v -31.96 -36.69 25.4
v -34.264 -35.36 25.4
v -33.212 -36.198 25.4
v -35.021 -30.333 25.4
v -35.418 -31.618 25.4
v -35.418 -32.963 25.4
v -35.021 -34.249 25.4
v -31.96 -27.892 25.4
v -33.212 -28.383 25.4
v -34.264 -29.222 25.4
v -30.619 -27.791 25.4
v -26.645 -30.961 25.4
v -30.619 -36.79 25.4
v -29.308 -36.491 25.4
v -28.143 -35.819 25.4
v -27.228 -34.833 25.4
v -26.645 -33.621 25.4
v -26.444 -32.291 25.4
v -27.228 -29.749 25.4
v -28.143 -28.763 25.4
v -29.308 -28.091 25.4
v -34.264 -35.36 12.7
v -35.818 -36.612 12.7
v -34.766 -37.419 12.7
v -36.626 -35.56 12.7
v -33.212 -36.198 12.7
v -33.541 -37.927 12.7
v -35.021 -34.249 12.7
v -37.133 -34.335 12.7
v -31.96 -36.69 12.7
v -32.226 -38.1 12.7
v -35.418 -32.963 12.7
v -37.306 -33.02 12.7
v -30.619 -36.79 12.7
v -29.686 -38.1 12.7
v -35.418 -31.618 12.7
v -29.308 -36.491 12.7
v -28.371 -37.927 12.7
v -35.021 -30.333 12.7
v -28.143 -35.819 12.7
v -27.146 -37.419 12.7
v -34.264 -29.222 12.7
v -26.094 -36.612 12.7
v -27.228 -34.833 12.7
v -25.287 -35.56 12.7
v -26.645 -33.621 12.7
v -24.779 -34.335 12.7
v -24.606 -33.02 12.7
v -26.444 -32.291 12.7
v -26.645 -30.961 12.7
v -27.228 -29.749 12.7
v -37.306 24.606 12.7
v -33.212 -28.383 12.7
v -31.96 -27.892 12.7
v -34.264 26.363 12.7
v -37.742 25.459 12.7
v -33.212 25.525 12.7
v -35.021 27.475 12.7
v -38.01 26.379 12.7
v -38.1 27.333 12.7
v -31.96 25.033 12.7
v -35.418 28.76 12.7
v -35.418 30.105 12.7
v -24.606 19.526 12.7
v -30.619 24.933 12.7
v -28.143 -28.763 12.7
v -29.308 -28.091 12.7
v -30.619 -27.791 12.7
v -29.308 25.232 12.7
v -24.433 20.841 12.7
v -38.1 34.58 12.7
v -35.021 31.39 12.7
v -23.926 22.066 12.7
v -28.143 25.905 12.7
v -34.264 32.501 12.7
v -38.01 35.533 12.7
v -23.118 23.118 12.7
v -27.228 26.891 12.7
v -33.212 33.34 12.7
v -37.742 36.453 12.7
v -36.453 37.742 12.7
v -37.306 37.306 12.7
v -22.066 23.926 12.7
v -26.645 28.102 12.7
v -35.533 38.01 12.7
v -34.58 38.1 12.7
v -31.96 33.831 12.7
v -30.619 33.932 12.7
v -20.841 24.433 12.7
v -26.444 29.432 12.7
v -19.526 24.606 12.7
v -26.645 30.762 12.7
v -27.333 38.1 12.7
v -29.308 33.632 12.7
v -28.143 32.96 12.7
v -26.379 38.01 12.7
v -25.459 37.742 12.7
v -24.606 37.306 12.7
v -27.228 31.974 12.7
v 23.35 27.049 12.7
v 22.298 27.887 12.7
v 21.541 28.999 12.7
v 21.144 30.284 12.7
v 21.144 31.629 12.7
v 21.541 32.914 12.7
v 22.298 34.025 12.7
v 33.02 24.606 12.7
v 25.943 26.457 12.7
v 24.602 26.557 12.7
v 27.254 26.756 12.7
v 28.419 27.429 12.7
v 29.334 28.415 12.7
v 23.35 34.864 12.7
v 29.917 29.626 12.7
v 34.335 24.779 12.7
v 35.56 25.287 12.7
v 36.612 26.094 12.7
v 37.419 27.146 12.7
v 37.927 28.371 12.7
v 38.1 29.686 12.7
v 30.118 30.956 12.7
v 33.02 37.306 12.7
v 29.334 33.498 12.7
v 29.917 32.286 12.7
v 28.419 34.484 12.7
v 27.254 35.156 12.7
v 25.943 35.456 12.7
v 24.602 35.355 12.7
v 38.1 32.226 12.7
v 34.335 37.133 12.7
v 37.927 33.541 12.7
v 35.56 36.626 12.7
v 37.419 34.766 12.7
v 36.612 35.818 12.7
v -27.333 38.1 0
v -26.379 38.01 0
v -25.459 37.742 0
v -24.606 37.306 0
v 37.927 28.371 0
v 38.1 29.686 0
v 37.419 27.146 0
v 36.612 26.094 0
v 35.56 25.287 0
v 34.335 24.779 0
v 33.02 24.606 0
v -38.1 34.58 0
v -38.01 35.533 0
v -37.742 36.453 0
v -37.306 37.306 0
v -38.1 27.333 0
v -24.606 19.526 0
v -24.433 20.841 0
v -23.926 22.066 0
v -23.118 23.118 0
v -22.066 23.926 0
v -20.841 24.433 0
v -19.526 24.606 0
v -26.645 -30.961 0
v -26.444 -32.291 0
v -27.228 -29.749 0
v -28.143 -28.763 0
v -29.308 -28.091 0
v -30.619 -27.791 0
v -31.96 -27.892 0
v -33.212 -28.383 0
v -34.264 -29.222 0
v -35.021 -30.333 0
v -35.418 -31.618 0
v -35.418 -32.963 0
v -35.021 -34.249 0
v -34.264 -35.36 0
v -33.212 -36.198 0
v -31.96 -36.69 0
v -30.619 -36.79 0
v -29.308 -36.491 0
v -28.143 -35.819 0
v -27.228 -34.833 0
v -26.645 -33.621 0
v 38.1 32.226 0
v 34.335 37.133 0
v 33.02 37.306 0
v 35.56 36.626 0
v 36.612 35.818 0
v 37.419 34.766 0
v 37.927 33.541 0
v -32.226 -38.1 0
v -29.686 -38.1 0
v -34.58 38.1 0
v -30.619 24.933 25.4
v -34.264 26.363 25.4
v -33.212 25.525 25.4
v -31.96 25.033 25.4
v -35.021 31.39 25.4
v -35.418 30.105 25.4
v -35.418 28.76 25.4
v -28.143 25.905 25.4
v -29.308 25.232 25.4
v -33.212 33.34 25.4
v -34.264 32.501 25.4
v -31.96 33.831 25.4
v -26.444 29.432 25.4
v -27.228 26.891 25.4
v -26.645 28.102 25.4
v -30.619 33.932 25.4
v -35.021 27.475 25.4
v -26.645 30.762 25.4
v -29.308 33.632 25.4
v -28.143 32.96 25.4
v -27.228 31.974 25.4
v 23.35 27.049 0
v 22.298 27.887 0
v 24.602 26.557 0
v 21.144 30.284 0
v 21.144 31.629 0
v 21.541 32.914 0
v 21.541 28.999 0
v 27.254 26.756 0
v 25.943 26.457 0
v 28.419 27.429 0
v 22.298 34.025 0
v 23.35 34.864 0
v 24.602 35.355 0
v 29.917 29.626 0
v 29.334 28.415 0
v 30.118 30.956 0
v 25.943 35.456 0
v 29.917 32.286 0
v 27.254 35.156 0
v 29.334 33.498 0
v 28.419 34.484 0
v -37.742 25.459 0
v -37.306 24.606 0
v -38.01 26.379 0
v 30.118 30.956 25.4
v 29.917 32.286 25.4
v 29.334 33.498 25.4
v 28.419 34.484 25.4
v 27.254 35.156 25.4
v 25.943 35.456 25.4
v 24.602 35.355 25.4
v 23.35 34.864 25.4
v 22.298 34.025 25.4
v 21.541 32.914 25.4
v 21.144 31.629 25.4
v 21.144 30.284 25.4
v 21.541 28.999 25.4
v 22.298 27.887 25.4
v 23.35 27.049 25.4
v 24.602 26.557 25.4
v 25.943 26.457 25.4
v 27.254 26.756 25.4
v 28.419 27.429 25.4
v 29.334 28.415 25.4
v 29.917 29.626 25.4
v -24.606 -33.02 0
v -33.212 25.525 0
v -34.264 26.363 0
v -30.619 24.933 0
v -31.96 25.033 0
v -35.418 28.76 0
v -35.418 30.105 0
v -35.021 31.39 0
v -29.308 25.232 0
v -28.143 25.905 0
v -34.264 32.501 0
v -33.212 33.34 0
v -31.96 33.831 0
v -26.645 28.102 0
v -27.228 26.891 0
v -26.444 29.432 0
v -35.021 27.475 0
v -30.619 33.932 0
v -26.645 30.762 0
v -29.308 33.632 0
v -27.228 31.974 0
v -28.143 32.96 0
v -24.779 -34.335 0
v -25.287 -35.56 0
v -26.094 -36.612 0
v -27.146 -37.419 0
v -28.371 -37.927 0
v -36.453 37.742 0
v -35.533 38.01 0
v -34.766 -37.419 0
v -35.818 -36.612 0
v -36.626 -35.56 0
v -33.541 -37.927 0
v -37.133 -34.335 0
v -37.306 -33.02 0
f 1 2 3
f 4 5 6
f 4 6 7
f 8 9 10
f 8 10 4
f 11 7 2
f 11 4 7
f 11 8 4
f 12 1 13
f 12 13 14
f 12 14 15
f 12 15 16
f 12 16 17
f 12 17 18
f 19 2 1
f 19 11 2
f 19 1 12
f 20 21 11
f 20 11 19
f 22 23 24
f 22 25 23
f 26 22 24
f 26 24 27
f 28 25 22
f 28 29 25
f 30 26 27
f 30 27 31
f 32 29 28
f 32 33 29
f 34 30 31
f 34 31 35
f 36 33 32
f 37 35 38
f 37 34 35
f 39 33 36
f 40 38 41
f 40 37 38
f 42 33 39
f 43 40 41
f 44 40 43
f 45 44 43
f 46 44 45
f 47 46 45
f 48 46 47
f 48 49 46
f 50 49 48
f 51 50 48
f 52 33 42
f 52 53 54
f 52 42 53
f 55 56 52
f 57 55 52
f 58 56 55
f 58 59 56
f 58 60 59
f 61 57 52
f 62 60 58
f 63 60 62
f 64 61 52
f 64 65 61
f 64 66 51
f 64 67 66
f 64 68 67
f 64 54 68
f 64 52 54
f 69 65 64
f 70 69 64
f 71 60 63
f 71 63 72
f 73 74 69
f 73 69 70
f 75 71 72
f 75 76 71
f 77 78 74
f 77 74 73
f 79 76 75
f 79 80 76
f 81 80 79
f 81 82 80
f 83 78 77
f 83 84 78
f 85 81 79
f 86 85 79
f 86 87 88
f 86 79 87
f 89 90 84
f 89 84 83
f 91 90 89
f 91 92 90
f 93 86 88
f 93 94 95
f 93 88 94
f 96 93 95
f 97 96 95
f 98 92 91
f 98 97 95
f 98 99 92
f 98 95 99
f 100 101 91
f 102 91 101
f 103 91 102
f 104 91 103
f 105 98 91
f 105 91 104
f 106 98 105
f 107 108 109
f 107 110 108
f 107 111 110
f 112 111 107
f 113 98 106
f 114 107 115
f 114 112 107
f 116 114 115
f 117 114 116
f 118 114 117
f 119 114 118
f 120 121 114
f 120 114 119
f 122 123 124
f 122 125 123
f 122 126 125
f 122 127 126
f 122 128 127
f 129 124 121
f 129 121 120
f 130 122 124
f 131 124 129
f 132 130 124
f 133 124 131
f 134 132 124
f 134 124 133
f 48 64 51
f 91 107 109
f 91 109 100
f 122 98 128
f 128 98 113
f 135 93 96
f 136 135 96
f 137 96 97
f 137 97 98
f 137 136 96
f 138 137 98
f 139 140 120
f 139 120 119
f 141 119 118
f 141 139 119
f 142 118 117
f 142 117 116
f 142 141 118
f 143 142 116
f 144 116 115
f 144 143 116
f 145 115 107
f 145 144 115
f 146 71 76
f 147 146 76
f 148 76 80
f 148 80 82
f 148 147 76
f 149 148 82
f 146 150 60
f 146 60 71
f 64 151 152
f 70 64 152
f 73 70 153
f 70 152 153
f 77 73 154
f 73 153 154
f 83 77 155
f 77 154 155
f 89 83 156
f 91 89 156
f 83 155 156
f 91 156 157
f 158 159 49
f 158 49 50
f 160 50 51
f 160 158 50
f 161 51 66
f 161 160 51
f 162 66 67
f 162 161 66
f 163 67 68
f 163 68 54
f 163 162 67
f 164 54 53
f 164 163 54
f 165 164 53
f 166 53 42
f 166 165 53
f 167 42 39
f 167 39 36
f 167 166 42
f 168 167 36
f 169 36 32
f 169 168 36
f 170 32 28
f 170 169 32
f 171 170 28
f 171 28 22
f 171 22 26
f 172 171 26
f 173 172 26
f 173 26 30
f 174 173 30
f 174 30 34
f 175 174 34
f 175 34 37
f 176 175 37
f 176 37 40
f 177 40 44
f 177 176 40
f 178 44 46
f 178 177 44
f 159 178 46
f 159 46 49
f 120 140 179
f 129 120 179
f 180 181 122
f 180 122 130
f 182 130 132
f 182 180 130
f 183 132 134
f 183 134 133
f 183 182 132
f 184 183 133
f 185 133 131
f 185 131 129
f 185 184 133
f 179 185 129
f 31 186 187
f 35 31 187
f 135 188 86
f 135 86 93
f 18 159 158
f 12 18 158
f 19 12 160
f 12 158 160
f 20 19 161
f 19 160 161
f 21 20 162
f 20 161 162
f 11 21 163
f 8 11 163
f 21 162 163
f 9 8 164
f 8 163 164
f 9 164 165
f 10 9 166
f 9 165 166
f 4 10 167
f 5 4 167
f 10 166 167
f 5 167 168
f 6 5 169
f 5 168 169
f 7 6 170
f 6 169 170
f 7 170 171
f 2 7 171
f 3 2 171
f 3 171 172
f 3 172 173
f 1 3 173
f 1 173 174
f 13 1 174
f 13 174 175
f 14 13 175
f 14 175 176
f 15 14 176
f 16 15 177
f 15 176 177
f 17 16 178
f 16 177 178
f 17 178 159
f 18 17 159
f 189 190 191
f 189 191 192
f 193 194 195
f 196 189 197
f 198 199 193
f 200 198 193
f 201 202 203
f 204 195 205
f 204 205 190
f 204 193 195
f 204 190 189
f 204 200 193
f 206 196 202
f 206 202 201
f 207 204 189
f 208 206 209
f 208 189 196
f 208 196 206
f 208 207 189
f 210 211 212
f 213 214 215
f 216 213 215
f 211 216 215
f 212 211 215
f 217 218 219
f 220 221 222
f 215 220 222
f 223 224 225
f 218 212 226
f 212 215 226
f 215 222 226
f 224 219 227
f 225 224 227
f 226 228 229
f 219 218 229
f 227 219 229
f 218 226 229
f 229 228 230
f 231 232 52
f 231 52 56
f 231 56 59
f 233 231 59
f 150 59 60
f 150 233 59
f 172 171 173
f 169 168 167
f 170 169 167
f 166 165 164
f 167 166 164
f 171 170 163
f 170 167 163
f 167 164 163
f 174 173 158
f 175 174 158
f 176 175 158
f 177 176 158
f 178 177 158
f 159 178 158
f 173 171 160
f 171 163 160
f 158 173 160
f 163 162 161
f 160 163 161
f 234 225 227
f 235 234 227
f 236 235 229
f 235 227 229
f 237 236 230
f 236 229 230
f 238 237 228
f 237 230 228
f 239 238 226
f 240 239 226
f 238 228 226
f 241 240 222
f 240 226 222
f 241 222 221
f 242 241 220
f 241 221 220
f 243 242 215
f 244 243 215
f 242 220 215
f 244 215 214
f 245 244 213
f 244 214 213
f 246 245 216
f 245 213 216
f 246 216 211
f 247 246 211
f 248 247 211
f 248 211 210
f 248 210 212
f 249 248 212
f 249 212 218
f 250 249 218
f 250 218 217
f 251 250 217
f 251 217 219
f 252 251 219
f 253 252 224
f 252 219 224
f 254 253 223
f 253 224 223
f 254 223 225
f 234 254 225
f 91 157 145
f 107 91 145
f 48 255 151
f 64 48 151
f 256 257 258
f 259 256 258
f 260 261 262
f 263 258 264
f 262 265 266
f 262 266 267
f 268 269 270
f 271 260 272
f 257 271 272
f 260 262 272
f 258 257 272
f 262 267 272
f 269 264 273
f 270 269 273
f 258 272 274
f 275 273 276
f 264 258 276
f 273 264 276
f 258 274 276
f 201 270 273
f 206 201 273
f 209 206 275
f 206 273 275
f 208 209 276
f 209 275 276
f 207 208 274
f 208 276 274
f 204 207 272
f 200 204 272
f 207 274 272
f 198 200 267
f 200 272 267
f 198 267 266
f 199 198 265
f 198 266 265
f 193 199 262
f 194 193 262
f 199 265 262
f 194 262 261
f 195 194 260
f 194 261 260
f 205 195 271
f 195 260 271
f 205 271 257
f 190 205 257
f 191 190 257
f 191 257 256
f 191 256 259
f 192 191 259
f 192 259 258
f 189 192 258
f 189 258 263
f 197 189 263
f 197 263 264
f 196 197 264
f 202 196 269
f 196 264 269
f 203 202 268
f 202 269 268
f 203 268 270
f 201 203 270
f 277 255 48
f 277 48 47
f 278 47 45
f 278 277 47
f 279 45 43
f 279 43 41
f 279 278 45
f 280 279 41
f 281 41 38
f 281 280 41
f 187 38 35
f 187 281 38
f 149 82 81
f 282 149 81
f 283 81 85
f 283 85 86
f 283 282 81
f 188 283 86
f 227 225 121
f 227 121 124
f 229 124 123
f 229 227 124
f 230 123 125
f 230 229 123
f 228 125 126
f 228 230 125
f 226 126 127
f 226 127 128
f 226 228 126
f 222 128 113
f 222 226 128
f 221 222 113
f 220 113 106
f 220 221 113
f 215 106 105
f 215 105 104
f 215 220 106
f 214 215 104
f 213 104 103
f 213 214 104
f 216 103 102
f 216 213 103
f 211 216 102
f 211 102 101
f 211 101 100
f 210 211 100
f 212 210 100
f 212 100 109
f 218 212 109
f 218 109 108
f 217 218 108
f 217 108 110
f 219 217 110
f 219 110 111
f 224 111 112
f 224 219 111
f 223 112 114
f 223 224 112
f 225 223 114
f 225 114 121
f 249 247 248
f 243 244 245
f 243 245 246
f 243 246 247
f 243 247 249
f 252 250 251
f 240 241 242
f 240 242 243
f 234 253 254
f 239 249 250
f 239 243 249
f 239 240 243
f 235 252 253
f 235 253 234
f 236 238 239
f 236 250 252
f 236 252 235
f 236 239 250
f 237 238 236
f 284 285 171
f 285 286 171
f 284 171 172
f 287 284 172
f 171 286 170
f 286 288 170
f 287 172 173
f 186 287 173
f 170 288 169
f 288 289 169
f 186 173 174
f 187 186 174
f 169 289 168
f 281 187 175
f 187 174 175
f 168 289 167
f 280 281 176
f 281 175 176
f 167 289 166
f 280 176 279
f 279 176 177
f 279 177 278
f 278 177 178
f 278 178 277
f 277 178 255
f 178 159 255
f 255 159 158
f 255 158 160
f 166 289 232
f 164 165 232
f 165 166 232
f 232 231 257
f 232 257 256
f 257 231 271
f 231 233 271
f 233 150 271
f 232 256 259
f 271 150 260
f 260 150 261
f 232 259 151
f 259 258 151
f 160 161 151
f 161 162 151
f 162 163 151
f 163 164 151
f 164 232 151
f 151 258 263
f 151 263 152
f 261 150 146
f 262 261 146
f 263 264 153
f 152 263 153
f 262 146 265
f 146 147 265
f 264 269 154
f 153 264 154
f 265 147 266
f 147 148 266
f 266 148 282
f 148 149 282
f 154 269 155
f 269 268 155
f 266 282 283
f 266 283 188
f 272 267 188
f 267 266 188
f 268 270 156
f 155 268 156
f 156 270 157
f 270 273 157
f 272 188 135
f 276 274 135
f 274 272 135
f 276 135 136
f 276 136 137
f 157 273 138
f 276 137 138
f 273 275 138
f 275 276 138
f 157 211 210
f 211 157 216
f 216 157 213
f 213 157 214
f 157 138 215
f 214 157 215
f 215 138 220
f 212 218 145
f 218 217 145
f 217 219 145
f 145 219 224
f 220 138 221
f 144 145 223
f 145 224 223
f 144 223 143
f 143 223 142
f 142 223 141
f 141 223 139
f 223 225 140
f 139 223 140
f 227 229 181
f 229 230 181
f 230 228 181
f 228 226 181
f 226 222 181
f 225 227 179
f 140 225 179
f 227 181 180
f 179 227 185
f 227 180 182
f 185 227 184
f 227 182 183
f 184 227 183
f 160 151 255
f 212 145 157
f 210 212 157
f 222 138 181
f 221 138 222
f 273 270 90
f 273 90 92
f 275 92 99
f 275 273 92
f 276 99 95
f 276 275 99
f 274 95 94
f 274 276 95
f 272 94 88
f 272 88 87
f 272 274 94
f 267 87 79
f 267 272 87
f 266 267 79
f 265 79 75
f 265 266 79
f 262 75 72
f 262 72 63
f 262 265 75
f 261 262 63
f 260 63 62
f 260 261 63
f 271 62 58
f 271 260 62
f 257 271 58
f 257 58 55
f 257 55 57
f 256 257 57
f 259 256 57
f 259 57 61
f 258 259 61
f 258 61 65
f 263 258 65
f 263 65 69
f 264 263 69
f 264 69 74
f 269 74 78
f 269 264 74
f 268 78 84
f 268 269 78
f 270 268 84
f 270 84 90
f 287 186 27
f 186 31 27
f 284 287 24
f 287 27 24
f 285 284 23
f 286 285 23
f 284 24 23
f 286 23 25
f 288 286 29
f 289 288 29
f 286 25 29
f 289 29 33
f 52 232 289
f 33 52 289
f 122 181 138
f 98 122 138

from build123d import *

# Parameters (mm, degrees)
F0_R         = 4.5120624022
F1_DEPTH     = 25.4
F0_W         = 0.7937453203
F0_H         = 12.7
F0_W_2       = 12.7
F0_H_2       = 0.7937453203
F2_DEPTH     = 12.7
F3_R         = 5.08
F4_T1_DEPTH  = 12.7
F4_T3_DEPTH  = 26.333067172
F4_T5_DEPTH  = 38.1
F4_T7_DEPTH  = 26.333067172
F4_T9_DEPTH  = 38.1
F4_T11_DEPTH = 26.333067172
F4_T13_DEPTH = 38.1
F4_T15_DEPTH = 26.333067172


# Not quite as in the source:
# - a fillet or chamfer that OpenCascade refuses, or shapes differently, is made with other operations: its cross-section is extruded or revolved along the edge and cut away or added


with BuildPart() as f1:
    # F0 (on Top) → F1 (new body)
    with BuildSketch(Plane.XY):
        with Locations((-30.9562546797, 29.4322539121)):
            Circle(F0_R)
    extrude(amount=F1_DEPTH)


with BuildPart() as f1b:
    # F0 (on Top) → F1, piece 2 (new body)
    with BuildSketch(Plane.XY):
        with Locations((25.6057605147, 30.9562546797)):
            Circle(F0_R)
    extrude(amount=F1_DEPTH)


with BuildPart() as f1c:
    # F0 (on Top) → F1, piece 3 (new body)
    with BuildSketch(Plane.XY):
        with Locations((-30.9562546797, -32.2909392416)):
            Circle(F0_R)
    extrude(amount=F1_DEPTH)


with BuildPart() as f2:
    # F0 (on Top) → F2 (new body)
    with BuildSketch(Plane.XY):
        Polygon((-37.3062546797, -38.1), (-24.6062546797, -38.1), (-24.6062546797, 24.6062546797), (38.1, 24.6062546797), (38.1, 37.3062546797), (-24.6062546797, 37.3062546797), (-37.3062546797, 37.3062546797), (-37.3062546797, 24.6062546797), align=None)
        with Locations((-30.9562546797, -32.2909392416)):
            Circle(F0_R, mode=Mode.SUBTRACT)
        with Locations((-30.9562546797, 29.4322539121)):
            Circle(F0_R, mode=Mode.SUBTRACT)
        with Locations((25.6057605147, 30.9562546797)):
            Circle(F0_R, mode=Mode.SUBTRACT)
        with Locations((-37.7031273399, 30.9562546797)):
            Rectangle(F0_W, F0_H)
        with Locations((-30.9562546797, 37.7031273399)):
            Rectangle(F0_W_2, F0_H_2)
    extrude(amount=F2_DEPTH)

    # F3
    f3_edges = [f2.edges().sort_by_distance(p)[0] for p in [
        (-37.306255, -38.1, 6.35),
    ]]
    fillet(f3_edges, radius=F3_R)

    # F4: fillet of radius 5.08 on 8 edges, made by hand

    # F4_s2 → F4_t1 (join)
    with BuildSketch(Plane.XY):
        with BuildLine():
            ThreePointArc((-24.6062546797, 19.5262546797), (-23.1183571281, 23.1183571281), (-19.5262546797, 24.6062546797))
            Line((-19.5262546797, 24.6062546797), (-24.6062546797, 24.6062546797))
            Line((-24.6062546797, 24.6062546797), (-24.6062546797, 19.5262546797))
        make_face()
    extrude(amount=F4_T1_DEPTH)

    # F4_s4 → F4_t3 (cut)
    with BuildSketch(Plane.XY.offset(-6.816533586)):
        with BuildLine():
            ThreePointArc((-37.3062546797, 24.6062546797), (-37.8975287684, 25.9129691341), (-38.1, 27.3328681141))
            Line((-38.1, 27.3328681141), (-38.1, 24.6062546797))
            Line((-38.1, 24.6062546797), (-37.3062546797, 24.6062546797))
        make_face()
    extrude(amount=F4_T3_DEPTH, mode=Mode.SUBTRACT)

    # F4_s6 → F4_t5 (cut)
    with BuildSketch(Plane.XY.offset(-12.7)):
        with BuildLine():
            ThreePointArc((-24.6062546797, -33.02), (-26.0941522313, -36.6121024484), (-29.6862546797, -38.1))
            Line((-29.6862546797, -38.1), (-24.6062546797, -38.1))
            Line((-24.6062546797, -38.1), (-24.6062546797, -33.02))
        make_face()
    extrude(amount=F4_T5_DEPTH, mode=Mode.SUBTRACT)

    # F4_s8 → F4_t7 (cut)
    with BuildSketch(Plane.XY.offset(-6.816533586)):
        with BuildLine():
            ThreePointArc((-38.1, 34.5796412453), (-37.8975287684, 35.9995402254), (-37.3062546797, 37.3062546797))
            Line((-37.3062546797, 37.3062546797), (-38.1, 37.3062546797))
            Line((-38.1, 37.3062546797), (-38.1, 34.5796412453))
        make_face()
    extrude(amount=F4_T7_DEPTH, mode=Mode.SUBTRACT)

    # F4_s10 → F4_t9 (cut)
    with BuildSketch(Plane.XY.offset(-12.7)):
        with BuildLine():
            ThreePointArc((38.1, 29.6862546797), (36.6121024484, 26.0941522313), (33.02, 24.6062546797))
            Line((33.02, 24.6062546797), (38.1, 24.6062546797))
            Line((38.1, 24.6062546797), (38.1, 29.6862546797))
        make_face()
    extrude(amount=F4_T9_DEPTH, mode=Mode.SUBTRACT)

    # F4_s12 → F4_t11 (cut)
    with BuildSketch(Plane.XY.offset(-6.816533586)):
        with BuildLine():
            ThreePointArc((-37.3062546797, 37.3062546797), (-35.9995402254, 37.8975287684), (-34.5796412453, 38.1))
            Line((-34.5796412453, 38.1), (-37.3062546797, 38.1))
            Line((-37.3062546797, 38.1), (-37.3062546797, 37.3062546797))
        make_face()
    extrude(amount=F4_T11_DEPTH, mode=Mode.SUBTRACT)

    # F4_s14 → F4_t13 (cut)
    with BuildSketch(Plane.XY.offset(-12.7)):
        with BuildLine():
            ThreePointArc((33.02, 37.3062546797), (36.6121024484, 35.8183571281), (38.1, 32.2262546797))
            Line((38.1, 32.2262546797), (38.1, 37.3062546797))
            Line((38.1, 37.3062546797), (33.02, 37.3062546797))
        make_face()
    extrude(amount=F4_T13_DEPTH, mode=Mode.SUBTRACT)

    # F4_s16 → F4_t15 (cut)
    with BuildSketch(Plane.XY.offset(-6.816533586)):
        with BuildLine():
            ThreePointArc((-27.3328681141, 38.1), (-25.9129691341, 37.8975287684), (-24.6062546797, 37.3062546797))
            Line((-24.6062546797, 37.3062546797), (-24.6062546797, 38.1))
            Line((-24.6062546797, 38.1), (-27.3328681141, 38.1))
        make_face()
    extrude(amount=F4_T15_DEPTH, mode=Mode.SUBTRACT)


solid = Compound([f1.part, f1b.part, f1c.part, f2.part])
